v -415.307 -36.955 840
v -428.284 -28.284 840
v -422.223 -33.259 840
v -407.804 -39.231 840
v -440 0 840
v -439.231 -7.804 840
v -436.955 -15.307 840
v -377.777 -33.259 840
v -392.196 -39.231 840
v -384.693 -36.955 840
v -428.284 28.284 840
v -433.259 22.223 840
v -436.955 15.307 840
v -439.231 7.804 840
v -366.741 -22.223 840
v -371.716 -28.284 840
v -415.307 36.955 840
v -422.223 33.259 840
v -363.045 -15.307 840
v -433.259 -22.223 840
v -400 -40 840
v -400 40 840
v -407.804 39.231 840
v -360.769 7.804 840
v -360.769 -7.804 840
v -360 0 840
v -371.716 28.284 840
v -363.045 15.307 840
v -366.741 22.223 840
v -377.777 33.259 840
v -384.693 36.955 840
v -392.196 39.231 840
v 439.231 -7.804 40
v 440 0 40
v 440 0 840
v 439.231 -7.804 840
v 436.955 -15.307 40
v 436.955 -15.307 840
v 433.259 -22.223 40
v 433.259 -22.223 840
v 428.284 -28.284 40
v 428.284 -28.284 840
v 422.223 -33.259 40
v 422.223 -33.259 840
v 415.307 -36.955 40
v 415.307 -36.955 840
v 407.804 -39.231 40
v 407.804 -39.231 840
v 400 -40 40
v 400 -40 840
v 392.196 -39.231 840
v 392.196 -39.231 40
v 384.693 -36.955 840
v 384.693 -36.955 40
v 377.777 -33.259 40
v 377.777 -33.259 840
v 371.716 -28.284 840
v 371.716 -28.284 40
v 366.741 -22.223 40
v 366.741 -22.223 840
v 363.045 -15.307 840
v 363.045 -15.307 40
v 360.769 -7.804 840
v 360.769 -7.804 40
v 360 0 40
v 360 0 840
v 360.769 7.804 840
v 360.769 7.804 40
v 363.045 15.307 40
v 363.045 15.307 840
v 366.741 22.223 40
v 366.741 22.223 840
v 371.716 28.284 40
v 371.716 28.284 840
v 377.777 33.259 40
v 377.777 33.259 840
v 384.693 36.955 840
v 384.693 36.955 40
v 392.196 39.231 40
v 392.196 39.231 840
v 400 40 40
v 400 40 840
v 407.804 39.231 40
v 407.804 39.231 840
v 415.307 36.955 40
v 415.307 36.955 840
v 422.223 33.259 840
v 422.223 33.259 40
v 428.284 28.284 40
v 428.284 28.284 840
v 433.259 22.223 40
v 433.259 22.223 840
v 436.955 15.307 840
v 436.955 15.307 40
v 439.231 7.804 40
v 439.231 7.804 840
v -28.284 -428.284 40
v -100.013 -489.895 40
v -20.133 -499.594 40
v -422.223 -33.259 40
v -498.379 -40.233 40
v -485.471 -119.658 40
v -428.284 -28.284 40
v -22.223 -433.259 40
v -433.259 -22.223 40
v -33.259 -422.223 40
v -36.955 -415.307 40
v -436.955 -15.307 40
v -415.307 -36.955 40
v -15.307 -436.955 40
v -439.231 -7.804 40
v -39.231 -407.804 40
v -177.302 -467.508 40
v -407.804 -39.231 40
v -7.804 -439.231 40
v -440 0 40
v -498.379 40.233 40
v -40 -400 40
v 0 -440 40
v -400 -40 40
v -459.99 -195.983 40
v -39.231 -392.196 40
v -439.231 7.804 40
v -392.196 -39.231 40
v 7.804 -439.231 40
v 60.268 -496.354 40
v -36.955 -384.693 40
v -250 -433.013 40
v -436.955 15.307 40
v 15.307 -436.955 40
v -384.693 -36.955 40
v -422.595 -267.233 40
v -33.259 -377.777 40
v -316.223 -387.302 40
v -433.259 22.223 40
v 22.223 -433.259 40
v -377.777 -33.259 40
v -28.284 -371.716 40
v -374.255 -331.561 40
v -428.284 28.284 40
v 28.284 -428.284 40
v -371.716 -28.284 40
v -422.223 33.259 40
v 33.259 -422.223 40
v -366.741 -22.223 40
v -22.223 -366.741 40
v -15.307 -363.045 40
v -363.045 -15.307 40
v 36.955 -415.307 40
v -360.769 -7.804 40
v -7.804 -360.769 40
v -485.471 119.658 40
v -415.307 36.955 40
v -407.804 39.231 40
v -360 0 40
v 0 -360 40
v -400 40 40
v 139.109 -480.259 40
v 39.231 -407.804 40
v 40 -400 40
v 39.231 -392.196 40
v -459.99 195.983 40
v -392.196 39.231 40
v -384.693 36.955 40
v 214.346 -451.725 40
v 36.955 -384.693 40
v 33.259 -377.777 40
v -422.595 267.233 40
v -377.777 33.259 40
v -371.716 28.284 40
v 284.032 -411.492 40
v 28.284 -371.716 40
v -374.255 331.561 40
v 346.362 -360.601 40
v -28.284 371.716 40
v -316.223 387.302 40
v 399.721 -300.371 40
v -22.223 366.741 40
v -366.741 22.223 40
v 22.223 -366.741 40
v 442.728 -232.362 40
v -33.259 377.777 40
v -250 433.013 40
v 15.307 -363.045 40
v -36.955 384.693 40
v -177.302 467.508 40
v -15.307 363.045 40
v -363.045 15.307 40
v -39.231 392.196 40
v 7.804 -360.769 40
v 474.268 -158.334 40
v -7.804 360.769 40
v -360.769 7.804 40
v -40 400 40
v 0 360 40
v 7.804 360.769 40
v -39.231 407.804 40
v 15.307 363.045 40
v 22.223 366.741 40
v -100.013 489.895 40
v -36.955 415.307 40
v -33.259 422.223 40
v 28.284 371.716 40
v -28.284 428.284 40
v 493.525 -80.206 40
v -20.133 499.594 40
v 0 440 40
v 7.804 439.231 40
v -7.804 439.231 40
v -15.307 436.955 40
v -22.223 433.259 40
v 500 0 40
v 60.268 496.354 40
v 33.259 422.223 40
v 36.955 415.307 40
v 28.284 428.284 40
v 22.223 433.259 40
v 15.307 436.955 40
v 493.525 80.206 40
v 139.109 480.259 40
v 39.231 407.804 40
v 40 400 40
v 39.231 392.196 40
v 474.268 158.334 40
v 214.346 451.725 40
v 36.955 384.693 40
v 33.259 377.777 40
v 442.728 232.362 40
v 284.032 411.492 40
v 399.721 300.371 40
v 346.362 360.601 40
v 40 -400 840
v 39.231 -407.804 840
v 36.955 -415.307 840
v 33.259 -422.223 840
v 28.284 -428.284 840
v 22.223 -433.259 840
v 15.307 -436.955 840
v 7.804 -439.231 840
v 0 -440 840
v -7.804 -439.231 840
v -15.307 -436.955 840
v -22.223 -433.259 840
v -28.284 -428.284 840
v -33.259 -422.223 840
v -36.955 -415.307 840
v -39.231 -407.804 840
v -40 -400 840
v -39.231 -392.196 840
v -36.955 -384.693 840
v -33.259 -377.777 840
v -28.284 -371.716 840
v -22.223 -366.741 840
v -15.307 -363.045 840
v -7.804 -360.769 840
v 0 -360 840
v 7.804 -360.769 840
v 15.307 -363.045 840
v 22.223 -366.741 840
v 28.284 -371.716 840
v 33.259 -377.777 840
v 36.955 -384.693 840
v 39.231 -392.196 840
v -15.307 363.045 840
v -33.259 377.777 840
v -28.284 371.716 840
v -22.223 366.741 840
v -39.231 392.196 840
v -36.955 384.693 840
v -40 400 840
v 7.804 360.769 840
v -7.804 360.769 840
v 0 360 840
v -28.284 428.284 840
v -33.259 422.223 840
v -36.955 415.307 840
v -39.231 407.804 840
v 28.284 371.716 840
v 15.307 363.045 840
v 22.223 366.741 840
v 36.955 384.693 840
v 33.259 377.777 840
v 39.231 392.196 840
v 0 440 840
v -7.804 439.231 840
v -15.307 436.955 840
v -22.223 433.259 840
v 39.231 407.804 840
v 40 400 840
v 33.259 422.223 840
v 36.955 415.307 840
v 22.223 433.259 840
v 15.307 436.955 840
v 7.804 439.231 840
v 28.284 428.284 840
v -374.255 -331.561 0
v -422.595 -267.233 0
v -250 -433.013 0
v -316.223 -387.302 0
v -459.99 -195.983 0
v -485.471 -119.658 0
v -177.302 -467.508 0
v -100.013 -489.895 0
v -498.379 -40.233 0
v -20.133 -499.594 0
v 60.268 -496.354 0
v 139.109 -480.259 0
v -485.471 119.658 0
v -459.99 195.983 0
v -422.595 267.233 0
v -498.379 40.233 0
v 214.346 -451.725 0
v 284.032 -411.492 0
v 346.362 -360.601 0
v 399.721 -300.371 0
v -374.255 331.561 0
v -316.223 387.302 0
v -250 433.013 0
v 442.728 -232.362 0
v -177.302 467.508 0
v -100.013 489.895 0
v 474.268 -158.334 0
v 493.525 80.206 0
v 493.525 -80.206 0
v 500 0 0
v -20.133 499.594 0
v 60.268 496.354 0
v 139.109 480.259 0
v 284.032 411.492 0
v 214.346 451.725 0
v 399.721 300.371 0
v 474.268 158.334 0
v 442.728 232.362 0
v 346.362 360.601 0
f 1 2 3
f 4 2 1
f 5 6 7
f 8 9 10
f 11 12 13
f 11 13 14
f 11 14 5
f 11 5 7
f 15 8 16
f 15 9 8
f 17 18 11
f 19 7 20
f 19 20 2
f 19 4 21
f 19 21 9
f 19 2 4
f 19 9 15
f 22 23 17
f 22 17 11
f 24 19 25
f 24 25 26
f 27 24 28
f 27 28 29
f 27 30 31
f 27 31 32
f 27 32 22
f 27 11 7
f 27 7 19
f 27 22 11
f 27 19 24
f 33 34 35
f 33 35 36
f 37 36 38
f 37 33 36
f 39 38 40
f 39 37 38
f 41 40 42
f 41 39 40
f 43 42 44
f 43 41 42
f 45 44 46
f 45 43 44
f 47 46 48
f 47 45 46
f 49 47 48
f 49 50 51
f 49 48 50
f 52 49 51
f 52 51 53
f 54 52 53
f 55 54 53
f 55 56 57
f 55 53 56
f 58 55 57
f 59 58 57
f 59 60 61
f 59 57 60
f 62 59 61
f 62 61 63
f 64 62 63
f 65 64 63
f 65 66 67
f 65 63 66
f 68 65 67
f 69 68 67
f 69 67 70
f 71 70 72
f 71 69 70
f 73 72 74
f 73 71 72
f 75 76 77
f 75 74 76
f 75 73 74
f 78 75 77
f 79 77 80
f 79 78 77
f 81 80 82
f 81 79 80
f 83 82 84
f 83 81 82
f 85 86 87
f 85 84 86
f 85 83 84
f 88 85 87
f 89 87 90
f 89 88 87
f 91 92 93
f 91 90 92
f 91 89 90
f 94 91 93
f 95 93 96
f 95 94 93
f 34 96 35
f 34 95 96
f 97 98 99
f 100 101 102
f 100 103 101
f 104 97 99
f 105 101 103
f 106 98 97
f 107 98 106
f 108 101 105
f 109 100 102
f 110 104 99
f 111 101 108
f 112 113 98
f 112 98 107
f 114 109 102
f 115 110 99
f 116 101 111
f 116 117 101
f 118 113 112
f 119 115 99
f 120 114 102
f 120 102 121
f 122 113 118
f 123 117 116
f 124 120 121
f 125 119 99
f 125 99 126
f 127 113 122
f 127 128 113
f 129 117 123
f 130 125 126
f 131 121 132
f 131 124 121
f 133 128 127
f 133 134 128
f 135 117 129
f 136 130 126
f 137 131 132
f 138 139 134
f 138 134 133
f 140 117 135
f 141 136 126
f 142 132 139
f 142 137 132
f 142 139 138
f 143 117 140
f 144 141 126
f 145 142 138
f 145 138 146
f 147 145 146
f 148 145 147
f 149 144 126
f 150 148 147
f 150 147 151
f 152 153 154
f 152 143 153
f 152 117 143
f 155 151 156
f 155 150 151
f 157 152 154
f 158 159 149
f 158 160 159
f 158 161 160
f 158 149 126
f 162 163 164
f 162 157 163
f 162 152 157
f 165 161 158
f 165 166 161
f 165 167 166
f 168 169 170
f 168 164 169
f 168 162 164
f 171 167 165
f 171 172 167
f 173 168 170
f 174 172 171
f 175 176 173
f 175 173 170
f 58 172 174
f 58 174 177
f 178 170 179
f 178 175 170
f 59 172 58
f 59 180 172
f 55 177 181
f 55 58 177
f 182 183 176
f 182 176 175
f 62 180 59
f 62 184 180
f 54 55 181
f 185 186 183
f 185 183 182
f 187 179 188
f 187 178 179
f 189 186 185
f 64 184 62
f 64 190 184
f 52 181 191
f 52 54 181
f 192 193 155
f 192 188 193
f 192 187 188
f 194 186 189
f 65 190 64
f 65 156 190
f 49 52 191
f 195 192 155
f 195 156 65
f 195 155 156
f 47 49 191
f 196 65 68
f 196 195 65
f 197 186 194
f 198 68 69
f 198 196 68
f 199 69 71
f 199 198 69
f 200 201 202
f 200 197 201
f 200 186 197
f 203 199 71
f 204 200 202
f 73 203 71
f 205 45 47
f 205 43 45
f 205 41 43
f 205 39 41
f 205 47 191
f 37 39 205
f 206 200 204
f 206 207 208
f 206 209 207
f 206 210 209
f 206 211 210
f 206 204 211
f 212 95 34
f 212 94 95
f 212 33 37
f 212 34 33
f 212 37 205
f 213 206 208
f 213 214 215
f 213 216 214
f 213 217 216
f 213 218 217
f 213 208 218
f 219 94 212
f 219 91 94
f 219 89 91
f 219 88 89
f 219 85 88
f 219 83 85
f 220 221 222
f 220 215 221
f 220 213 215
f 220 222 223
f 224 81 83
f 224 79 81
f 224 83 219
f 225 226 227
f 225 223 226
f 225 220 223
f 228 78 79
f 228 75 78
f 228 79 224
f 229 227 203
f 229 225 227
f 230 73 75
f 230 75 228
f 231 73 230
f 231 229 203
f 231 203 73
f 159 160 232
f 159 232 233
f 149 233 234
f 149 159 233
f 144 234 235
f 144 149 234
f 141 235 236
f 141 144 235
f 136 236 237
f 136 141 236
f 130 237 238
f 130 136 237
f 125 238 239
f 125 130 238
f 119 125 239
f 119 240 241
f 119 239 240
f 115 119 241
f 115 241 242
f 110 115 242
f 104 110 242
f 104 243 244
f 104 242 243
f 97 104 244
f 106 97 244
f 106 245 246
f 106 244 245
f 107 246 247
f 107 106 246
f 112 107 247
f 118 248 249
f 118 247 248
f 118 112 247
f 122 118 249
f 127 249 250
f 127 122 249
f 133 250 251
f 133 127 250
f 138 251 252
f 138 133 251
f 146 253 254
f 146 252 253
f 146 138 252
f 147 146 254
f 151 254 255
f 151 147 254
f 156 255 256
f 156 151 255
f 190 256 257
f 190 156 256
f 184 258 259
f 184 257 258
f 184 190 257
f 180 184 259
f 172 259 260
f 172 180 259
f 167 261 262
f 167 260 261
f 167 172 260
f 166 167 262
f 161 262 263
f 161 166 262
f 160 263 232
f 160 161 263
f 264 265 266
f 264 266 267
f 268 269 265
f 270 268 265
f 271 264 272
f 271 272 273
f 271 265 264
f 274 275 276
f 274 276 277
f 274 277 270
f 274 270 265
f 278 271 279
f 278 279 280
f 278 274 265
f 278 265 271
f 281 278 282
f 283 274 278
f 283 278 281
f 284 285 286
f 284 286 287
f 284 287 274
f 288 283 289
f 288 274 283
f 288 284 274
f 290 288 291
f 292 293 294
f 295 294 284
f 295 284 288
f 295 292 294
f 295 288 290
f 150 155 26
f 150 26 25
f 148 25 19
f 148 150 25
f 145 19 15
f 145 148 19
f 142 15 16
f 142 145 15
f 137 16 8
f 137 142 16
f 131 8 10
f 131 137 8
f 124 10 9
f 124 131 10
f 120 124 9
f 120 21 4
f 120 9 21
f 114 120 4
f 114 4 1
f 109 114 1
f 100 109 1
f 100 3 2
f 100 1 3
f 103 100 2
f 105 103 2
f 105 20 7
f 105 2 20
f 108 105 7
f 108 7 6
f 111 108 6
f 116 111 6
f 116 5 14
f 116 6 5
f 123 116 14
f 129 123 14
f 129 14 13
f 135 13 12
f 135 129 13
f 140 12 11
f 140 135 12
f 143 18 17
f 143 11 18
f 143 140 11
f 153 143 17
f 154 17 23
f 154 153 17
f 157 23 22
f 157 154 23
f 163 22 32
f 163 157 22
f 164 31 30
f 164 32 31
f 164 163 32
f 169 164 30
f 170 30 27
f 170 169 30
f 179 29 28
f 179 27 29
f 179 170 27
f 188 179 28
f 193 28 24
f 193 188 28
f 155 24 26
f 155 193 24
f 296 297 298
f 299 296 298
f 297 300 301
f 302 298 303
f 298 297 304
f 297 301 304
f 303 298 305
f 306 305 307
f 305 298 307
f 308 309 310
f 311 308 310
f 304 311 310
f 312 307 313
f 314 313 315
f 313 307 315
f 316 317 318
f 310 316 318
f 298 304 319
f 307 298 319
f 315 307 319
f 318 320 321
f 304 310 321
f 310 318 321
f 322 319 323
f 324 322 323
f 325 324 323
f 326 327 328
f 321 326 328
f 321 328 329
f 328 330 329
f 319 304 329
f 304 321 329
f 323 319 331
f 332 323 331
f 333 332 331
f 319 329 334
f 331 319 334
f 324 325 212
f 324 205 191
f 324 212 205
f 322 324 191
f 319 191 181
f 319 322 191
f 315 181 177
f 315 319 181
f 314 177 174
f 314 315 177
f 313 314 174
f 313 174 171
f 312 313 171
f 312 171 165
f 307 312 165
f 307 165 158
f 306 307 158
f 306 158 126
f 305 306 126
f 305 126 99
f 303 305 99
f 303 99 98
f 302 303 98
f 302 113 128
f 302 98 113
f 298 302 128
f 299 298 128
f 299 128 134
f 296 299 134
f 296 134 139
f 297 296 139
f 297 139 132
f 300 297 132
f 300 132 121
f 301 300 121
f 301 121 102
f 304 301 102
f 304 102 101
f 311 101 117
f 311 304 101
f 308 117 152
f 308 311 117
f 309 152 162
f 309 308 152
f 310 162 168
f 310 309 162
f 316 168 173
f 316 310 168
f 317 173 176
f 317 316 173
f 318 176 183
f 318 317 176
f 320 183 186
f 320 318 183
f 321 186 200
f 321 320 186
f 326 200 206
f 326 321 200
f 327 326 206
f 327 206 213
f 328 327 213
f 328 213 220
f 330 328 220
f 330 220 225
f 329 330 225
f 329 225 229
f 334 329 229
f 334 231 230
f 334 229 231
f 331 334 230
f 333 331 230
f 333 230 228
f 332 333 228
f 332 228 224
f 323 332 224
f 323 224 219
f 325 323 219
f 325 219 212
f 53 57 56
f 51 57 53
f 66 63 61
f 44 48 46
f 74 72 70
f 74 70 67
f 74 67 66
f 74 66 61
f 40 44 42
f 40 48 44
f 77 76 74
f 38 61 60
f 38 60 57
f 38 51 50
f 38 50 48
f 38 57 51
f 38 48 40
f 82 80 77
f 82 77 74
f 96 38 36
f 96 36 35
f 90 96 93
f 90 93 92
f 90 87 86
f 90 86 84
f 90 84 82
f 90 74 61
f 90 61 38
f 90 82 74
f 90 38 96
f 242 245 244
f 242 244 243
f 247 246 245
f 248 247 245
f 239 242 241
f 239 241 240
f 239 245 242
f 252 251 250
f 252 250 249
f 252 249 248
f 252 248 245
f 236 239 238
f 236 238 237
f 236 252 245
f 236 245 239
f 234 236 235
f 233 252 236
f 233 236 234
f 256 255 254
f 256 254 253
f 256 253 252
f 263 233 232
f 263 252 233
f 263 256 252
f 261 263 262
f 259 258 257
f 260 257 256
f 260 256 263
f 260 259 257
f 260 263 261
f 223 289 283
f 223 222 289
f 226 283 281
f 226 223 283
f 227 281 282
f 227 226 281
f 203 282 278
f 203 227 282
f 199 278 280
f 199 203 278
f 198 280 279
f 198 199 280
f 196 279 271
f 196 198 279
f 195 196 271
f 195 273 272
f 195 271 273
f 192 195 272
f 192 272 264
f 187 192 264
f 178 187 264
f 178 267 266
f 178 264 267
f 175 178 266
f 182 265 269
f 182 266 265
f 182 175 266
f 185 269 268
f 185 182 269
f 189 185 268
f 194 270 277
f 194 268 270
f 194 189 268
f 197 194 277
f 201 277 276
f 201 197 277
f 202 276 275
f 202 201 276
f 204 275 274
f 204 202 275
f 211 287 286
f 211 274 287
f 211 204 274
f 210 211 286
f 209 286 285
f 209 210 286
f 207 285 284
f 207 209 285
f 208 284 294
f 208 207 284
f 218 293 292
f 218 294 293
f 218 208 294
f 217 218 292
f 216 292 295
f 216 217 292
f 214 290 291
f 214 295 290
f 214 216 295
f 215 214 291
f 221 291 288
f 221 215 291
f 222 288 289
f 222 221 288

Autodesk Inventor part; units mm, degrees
ref_plane "YZ Plane" through (0, 0, 0) normal (1, 0, 0) x (0, 1, 0)
ref_plane "XZ Plane" through (0, 0, 0) normal (0, 1, 0) x (-1, 0, 0)
sketch "Sketch1" plane through (0, 0, 0) normal (0, 0, 1) x (1, 0, 0)
  circle A0 centre (0, 0) radius 500
  dimension "d0" = 1000
extrude "Extrusion1" add sketch "Sketch1" along normal blind 40
ref_plane "Work Plane1" through (0, 0, 40) normal (0, 0, 1) x (1, 0, 0)
sketch "Sketch2" plane through (0, 0, 40) normal (0, 0, 1) x (1, 0, 0)
  circle A0 centre (0, 400) radius 40
  circle A1 centre (400, 0) radius 40
  circle A2 centre (0, -400) radius 40
  circle A3 centre (-400, 0) radius 40
  point P0 (0, 0)
  dimension "d4" = 80
  dimension "d5" = 80
  dimension "d6" = 80
  dimension "d7" = 80
  dimension "d8" = 400
  dimension "d9" = 400
  dimension "d10" = 400
  dimension "d11" = 400
extrude "Extrusion2" add sketch "Sketch2" along normal blind 800
properties part number "Maitri_table"
